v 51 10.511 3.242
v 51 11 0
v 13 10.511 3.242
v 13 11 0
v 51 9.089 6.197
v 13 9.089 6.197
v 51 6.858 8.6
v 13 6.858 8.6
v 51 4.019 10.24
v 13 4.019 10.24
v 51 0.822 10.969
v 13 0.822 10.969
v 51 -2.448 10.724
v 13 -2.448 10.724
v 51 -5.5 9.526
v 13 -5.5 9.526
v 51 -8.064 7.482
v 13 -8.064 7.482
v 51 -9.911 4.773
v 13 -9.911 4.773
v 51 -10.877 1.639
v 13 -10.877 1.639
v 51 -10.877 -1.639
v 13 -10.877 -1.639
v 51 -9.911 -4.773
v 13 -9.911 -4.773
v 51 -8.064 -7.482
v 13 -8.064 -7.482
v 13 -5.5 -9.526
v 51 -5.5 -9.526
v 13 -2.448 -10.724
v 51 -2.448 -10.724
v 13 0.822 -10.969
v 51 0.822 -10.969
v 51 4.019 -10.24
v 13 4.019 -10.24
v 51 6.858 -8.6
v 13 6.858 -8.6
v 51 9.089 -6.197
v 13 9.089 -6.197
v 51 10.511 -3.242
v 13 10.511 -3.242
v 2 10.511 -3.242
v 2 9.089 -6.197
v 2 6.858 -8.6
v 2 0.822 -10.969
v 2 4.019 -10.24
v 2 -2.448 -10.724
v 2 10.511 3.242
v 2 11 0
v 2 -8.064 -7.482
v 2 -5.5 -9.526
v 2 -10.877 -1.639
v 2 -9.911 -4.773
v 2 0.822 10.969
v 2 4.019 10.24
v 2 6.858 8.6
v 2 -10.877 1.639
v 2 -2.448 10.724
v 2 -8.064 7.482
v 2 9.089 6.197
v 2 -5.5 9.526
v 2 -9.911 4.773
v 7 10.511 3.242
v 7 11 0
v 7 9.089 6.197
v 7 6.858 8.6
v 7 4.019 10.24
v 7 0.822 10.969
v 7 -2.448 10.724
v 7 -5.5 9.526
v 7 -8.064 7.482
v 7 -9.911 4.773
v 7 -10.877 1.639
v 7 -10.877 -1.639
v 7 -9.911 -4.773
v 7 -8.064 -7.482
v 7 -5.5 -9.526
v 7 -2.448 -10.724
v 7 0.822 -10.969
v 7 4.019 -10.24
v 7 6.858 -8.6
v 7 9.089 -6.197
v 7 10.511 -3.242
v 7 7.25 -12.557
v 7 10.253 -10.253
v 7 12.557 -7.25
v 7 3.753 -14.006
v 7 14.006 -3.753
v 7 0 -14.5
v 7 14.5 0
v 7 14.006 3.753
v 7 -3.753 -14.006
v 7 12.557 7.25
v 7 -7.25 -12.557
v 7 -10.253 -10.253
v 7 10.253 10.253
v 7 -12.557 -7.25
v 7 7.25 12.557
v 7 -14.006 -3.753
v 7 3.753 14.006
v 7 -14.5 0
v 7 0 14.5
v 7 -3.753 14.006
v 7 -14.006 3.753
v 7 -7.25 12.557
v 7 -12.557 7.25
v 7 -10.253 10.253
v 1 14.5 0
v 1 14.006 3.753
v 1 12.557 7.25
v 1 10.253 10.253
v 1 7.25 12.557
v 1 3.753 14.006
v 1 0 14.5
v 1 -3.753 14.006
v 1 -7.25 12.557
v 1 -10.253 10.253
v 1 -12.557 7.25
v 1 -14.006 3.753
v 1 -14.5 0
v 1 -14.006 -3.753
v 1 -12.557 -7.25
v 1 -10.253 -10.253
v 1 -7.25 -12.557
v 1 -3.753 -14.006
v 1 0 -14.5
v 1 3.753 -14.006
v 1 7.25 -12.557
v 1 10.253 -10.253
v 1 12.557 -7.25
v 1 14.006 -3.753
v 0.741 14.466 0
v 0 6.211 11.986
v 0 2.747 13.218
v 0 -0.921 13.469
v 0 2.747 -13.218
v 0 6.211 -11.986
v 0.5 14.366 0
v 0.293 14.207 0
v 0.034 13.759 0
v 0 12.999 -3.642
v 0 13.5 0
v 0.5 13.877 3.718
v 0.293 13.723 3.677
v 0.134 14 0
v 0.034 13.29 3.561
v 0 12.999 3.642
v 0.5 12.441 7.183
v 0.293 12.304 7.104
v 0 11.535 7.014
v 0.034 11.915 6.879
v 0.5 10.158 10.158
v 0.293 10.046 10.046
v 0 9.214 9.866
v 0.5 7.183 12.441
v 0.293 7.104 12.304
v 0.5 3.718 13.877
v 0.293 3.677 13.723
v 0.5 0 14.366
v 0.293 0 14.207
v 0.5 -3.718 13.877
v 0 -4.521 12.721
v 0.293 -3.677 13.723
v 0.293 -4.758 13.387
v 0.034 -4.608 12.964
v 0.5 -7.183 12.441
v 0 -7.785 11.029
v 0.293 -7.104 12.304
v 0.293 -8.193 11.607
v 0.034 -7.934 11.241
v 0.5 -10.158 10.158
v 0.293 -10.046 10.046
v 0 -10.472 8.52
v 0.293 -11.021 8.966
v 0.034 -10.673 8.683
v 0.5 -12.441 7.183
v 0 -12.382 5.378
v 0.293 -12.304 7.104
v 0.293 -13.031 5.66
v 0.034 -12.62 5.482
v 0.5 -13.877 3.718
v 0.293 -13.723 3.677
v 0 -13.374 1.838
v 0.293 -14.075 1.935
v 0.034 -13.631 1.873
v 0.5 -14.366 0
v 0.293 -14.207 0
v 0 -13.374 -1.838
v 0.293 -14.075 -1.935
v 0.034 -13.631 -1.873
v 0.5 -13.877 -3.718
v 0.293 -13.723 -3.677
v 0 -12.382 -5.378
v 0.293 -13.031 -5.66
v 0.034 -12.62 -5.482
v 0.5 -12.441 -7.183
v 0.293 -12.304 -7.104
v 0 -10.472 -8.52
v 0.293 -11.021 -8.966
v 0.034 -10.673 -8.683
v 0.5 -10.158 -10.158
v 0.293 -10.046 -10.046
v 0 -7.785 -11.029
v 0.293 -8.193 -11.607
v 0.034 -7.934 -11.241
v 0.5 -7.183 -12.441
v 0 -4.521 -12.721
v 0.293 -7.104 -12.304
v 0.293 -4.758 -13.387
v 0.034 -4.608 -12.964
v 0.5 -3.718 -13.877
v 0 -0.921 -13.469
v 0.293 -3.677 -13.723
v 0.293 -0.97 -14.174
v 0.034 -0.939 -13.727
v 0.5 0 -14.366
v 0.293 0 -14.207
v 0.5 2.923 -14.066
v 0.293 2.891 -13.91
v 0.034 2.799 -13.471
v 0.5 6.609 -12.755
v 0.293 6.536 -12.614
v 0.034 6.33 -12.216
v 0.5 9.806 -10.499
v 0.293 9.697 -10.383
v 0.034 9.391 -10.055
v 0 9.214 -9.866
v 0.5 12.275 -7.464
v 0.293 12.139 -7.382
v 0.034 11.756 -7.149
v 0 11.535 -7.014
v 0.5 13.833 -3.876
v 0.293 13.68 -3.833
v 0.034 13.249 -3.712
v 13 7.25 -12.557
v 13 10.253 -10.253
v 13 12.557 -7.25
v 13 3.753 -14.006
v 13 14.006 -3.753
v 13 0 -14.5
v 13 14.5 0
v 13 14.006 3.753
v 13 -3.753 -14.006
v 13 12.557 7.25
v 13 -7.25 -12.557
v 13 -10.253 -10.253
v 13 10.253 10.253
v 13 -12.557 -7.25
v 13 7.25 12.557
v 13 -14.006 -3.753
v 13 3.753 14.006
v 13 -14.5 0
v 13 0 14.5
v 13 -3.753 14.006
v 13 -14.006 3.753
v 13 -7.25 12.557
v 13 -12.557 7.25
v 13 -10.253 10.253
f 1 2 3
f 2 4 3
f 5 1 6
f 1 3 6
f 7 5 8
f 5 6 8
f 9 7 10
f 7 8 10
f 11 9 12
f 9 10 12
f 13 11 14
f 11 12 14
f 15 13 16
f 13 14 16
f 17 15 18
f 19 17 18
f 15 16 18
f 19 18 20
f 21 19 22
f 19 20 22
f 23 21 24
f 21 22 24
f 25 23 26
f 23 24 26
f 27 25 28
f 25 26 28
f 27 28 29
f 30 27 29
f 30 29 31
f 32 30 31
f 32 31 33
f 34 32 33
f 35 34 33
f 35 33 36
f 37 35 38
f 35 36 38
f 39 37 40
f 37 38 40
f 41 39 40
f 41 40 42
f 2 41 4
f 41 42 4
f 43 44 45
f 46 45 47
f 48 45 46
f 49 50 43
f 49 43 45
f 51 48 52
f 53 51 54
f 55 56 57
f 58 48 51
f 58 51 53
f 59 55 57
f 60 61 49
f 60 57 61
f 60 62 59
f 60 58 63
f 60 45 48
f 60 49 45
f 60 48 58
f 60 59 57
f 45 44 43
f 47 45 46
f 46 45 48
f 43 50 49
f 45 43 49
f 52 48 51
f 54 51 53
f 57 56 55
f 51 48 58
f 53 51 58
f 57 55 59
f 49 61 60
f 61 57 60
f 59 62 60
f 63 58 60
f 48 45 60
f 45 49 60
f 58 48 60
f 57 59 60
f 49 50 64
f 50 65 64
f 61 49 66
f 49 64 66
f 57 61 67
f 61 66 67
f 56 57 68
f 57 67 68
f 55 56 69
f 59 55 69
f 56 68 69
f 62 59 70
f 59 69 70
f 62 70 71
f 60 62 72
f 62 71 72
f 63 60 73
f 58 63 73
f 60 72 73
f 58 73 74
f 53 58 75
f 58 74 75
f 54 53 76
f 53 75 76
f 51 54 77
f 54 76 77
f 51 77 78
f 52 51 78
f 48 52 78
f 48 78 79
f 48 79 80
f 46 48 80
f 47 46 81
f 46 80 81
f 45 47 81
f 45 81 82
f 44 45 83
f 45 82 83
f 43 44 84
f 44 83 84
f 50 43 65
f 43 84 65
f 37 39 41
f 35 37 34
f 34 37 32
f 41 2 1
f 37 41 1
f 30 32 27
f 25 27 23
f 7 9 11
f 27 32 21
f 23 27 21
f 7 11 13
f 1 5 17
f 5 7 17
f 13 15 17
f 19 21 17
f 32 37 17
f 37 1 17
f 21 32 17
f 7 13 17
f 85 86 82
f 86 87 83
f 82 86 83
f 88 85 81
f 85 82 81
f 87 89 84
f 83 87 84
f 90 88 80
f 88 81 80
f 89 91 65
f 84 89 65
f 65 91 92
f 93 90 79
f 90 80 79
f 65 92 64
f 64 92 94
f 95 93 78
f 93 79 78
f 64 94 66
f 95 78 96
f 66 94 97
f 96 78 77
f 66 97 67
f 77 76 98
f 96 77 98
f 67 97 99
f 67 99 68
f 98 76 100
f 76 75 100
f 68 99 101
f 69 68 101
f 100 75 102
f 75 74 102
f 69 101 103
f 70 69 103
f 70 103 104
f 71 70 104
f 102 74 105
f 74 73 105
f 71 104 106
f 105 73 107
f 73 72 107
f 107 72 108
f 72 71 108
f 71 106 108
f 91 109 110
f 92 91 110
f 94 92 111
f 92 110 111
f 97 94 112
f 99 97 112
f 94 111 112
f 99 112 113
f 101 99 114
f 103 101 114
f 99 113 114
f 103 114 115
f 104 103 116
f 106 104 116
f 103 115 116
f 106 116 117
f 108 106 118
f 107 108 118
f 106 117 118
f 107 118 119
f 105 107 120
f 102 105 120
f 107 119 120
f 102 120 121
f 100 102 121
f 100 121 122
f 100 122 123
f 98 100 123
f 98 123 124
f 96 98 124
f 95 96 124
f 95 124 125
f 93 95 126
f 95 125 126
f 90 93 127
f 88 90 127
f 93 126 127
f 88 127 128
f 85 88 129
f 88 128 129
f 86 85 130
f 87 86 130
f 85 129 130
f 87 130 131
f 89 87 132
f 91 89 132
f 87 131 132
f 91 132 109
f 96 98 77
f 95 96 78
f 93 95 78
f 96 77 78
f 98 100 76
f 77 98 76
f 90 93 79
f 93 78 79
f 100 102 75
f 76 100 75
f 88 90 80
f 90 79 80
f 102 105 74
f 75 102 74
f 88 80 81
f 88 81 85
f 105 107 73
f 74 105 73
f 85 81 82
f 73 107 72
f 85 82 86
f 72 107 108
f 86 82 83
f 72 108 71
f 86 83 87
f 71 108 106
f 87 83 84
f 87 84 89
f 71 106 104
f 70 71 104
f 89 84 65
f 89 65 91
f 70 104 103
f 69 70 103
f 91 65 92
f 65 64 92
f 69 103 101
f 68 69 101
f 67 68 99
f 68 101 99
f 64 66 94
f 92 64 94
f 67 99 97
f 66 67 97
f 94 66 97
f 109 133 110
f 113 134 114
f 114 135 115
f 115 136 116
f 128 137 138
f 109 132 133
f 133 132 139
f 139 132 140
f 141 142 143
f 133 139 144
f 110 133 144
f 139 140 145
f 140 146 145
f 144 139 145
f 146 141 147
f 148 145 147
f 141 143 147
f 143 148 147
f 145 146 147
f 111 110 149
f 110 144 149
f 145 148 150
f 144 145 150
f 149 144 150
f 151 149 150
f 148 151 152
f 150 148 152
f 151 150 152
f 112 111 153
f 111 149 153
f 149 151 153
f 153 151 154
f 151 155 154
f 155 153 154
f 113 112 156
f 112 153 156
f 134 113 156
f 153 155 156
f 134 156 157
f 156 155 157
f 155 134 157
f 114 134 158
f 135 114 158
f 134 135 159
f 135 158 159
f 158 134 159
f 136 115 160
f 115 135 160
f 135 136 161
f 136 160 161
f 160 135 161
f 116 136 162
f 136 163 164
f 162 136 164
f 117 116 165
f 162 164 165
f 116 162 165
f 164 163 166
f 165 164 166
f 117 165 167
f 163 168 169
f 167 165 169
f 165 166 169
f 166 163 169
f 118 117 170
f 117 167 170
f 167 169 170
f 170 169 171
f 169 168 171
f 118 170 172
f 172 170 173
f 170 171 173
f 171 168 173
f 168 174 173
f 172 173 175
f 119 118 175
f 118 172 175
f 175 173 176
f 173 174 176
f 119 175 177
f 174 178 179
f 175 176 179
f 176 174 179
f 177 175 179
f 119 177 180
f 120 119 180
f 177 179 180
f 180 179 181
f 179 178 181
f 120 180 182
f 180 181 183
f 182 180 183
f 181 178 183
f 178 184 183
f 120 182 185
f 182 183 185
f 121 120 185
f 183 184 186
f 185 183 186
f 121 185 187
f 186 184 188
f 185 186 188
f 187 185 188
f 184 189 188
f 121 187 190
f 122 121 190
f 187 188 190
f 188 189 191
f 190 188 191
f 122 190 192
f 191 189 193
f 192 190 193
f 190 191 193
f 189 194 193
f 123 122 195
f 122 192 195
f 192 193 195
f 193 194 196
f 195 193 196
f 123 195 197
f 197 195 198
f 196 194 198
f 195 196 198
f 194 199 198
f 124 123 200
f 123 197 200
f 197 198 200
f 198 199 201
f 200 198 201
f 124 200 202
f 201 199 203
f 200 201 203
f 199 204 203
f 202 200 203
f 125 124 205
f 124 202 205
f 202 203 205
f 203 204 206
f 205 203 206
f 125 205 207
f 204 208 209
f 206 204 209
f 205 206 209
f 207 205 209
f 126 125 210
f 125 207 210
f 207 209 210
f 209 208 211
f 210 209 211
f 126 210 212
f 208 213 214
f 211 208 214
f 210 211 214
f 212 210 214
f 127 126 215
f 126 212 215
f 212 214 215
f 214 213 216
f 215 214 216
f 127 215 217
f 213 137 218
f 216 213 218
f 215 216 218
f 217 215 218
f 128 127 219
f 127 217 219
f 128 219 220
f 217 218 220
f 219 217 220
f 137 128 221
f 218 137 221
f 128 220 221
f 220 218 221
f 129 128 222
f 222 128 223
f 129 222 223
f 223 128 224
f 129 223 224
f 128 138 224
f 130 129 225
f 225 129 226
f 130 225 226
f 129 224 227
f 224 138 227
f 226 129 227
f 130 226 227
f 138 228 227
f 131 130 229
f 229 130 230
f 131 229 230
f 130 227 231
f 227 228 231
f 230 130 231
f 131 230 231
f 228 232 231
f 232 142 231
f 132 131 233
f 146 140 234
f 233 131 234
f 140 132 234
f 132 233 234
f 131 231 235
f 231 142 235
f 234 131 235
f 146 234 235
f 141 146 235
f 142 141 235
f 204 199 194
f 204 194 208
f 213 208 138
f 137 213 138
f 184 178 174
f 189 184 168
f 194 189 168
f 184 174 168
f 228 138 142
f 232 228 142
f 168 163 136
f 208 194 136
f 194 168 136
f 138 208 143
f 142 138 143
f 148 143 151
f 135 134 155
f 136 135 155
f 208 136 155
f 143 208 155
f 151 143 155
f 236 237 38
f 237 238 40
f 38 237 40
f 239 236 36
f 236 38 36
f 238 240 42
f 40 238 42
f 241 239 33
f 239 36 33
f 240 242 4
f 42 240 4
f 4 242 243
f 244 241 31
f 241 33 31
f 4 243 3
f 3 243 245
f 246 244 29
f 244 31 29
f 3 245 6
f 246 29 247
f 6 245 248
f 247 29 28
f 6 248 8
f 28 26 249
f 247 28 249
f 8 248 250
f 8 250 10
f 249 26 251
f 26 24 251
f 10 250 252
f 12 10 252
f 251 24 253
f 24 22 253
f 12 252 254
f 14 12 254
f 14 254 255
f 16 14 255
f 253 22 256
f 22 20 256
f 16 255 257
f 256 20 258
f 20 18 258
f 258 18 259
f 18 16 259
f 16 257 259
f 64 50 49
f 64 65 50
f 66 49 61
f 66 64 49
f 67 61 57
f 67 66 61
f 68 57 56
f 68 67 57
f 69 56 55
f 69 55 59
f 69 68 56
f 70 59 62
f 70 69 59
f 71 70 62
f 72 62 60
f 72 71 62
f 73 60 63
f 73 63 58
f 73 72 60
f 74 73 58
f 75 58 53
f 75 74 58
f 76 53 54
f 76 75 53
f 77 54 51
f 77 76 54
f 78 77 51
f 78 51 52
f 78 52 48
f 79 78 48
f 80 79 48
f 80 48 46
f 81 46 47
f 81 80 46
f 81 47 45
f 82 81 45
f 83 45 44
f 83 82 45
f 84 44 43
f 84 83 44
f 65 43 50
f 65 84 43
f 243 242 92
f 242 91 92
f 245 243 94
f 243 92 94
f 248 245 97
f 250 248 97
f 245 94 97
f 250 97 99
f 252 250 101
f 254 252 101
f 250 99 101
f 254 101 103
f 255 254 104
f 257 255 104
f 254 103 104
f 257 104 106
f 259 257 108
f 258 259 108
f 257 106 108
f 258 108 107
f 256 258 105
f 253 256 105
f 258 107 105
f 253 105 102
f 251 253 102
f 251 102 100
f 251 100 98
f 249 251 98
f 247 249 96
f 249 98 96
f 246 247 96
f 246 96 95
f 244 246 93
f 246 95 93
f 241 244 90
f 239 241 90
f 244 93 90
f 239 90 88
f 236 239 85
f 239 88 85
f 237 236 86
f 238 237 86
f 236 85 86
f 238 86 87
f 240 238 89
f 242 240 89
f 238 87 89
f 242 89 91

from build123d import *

# Parameters (mm, degrees)
F0_W   = 5
F0_H   = 11
F0_W_2 = 2
F3_R   = 1


with BuildPart() as f1:
    # F0 (on Top) → F1 (revolve)
    with BuildSketch(Plane.XY):
        with Locations((4.5, 5.5)):
            Rectangle(F0_W, F0_H)
        Polygon((7, 0), (51, 0), (51, 11), (13, 11), (13, 14.5), (7, 14.5), (7, 11), align=None)
    revolve(axis=Axis((29, 0, 0), (1, 0, 0)))


with BuildPart() as f2:
    # F0 (on Top) → F2 (revolve)
    with BuildSketch(Plane.XY):
        Polygon((2, 11), (7, 11), (7, 14.5), (0, 14.5), (0, 11), align=None)
        with Locations((1, 5.5)):
            Rectangle(F0_W_2, F0_H)
    revolve(axis=Axis((3.5, 0, 0), (1, 0, 0)))

    # F3
    f3_edges = [f2.edges().sort_by_distance(p)[0] for p in [
        (0, -14.5, 0),
    ]]
    fillet(f3_edges, radius=F3_R)


solid = Compound([f1.part, f2.part])
